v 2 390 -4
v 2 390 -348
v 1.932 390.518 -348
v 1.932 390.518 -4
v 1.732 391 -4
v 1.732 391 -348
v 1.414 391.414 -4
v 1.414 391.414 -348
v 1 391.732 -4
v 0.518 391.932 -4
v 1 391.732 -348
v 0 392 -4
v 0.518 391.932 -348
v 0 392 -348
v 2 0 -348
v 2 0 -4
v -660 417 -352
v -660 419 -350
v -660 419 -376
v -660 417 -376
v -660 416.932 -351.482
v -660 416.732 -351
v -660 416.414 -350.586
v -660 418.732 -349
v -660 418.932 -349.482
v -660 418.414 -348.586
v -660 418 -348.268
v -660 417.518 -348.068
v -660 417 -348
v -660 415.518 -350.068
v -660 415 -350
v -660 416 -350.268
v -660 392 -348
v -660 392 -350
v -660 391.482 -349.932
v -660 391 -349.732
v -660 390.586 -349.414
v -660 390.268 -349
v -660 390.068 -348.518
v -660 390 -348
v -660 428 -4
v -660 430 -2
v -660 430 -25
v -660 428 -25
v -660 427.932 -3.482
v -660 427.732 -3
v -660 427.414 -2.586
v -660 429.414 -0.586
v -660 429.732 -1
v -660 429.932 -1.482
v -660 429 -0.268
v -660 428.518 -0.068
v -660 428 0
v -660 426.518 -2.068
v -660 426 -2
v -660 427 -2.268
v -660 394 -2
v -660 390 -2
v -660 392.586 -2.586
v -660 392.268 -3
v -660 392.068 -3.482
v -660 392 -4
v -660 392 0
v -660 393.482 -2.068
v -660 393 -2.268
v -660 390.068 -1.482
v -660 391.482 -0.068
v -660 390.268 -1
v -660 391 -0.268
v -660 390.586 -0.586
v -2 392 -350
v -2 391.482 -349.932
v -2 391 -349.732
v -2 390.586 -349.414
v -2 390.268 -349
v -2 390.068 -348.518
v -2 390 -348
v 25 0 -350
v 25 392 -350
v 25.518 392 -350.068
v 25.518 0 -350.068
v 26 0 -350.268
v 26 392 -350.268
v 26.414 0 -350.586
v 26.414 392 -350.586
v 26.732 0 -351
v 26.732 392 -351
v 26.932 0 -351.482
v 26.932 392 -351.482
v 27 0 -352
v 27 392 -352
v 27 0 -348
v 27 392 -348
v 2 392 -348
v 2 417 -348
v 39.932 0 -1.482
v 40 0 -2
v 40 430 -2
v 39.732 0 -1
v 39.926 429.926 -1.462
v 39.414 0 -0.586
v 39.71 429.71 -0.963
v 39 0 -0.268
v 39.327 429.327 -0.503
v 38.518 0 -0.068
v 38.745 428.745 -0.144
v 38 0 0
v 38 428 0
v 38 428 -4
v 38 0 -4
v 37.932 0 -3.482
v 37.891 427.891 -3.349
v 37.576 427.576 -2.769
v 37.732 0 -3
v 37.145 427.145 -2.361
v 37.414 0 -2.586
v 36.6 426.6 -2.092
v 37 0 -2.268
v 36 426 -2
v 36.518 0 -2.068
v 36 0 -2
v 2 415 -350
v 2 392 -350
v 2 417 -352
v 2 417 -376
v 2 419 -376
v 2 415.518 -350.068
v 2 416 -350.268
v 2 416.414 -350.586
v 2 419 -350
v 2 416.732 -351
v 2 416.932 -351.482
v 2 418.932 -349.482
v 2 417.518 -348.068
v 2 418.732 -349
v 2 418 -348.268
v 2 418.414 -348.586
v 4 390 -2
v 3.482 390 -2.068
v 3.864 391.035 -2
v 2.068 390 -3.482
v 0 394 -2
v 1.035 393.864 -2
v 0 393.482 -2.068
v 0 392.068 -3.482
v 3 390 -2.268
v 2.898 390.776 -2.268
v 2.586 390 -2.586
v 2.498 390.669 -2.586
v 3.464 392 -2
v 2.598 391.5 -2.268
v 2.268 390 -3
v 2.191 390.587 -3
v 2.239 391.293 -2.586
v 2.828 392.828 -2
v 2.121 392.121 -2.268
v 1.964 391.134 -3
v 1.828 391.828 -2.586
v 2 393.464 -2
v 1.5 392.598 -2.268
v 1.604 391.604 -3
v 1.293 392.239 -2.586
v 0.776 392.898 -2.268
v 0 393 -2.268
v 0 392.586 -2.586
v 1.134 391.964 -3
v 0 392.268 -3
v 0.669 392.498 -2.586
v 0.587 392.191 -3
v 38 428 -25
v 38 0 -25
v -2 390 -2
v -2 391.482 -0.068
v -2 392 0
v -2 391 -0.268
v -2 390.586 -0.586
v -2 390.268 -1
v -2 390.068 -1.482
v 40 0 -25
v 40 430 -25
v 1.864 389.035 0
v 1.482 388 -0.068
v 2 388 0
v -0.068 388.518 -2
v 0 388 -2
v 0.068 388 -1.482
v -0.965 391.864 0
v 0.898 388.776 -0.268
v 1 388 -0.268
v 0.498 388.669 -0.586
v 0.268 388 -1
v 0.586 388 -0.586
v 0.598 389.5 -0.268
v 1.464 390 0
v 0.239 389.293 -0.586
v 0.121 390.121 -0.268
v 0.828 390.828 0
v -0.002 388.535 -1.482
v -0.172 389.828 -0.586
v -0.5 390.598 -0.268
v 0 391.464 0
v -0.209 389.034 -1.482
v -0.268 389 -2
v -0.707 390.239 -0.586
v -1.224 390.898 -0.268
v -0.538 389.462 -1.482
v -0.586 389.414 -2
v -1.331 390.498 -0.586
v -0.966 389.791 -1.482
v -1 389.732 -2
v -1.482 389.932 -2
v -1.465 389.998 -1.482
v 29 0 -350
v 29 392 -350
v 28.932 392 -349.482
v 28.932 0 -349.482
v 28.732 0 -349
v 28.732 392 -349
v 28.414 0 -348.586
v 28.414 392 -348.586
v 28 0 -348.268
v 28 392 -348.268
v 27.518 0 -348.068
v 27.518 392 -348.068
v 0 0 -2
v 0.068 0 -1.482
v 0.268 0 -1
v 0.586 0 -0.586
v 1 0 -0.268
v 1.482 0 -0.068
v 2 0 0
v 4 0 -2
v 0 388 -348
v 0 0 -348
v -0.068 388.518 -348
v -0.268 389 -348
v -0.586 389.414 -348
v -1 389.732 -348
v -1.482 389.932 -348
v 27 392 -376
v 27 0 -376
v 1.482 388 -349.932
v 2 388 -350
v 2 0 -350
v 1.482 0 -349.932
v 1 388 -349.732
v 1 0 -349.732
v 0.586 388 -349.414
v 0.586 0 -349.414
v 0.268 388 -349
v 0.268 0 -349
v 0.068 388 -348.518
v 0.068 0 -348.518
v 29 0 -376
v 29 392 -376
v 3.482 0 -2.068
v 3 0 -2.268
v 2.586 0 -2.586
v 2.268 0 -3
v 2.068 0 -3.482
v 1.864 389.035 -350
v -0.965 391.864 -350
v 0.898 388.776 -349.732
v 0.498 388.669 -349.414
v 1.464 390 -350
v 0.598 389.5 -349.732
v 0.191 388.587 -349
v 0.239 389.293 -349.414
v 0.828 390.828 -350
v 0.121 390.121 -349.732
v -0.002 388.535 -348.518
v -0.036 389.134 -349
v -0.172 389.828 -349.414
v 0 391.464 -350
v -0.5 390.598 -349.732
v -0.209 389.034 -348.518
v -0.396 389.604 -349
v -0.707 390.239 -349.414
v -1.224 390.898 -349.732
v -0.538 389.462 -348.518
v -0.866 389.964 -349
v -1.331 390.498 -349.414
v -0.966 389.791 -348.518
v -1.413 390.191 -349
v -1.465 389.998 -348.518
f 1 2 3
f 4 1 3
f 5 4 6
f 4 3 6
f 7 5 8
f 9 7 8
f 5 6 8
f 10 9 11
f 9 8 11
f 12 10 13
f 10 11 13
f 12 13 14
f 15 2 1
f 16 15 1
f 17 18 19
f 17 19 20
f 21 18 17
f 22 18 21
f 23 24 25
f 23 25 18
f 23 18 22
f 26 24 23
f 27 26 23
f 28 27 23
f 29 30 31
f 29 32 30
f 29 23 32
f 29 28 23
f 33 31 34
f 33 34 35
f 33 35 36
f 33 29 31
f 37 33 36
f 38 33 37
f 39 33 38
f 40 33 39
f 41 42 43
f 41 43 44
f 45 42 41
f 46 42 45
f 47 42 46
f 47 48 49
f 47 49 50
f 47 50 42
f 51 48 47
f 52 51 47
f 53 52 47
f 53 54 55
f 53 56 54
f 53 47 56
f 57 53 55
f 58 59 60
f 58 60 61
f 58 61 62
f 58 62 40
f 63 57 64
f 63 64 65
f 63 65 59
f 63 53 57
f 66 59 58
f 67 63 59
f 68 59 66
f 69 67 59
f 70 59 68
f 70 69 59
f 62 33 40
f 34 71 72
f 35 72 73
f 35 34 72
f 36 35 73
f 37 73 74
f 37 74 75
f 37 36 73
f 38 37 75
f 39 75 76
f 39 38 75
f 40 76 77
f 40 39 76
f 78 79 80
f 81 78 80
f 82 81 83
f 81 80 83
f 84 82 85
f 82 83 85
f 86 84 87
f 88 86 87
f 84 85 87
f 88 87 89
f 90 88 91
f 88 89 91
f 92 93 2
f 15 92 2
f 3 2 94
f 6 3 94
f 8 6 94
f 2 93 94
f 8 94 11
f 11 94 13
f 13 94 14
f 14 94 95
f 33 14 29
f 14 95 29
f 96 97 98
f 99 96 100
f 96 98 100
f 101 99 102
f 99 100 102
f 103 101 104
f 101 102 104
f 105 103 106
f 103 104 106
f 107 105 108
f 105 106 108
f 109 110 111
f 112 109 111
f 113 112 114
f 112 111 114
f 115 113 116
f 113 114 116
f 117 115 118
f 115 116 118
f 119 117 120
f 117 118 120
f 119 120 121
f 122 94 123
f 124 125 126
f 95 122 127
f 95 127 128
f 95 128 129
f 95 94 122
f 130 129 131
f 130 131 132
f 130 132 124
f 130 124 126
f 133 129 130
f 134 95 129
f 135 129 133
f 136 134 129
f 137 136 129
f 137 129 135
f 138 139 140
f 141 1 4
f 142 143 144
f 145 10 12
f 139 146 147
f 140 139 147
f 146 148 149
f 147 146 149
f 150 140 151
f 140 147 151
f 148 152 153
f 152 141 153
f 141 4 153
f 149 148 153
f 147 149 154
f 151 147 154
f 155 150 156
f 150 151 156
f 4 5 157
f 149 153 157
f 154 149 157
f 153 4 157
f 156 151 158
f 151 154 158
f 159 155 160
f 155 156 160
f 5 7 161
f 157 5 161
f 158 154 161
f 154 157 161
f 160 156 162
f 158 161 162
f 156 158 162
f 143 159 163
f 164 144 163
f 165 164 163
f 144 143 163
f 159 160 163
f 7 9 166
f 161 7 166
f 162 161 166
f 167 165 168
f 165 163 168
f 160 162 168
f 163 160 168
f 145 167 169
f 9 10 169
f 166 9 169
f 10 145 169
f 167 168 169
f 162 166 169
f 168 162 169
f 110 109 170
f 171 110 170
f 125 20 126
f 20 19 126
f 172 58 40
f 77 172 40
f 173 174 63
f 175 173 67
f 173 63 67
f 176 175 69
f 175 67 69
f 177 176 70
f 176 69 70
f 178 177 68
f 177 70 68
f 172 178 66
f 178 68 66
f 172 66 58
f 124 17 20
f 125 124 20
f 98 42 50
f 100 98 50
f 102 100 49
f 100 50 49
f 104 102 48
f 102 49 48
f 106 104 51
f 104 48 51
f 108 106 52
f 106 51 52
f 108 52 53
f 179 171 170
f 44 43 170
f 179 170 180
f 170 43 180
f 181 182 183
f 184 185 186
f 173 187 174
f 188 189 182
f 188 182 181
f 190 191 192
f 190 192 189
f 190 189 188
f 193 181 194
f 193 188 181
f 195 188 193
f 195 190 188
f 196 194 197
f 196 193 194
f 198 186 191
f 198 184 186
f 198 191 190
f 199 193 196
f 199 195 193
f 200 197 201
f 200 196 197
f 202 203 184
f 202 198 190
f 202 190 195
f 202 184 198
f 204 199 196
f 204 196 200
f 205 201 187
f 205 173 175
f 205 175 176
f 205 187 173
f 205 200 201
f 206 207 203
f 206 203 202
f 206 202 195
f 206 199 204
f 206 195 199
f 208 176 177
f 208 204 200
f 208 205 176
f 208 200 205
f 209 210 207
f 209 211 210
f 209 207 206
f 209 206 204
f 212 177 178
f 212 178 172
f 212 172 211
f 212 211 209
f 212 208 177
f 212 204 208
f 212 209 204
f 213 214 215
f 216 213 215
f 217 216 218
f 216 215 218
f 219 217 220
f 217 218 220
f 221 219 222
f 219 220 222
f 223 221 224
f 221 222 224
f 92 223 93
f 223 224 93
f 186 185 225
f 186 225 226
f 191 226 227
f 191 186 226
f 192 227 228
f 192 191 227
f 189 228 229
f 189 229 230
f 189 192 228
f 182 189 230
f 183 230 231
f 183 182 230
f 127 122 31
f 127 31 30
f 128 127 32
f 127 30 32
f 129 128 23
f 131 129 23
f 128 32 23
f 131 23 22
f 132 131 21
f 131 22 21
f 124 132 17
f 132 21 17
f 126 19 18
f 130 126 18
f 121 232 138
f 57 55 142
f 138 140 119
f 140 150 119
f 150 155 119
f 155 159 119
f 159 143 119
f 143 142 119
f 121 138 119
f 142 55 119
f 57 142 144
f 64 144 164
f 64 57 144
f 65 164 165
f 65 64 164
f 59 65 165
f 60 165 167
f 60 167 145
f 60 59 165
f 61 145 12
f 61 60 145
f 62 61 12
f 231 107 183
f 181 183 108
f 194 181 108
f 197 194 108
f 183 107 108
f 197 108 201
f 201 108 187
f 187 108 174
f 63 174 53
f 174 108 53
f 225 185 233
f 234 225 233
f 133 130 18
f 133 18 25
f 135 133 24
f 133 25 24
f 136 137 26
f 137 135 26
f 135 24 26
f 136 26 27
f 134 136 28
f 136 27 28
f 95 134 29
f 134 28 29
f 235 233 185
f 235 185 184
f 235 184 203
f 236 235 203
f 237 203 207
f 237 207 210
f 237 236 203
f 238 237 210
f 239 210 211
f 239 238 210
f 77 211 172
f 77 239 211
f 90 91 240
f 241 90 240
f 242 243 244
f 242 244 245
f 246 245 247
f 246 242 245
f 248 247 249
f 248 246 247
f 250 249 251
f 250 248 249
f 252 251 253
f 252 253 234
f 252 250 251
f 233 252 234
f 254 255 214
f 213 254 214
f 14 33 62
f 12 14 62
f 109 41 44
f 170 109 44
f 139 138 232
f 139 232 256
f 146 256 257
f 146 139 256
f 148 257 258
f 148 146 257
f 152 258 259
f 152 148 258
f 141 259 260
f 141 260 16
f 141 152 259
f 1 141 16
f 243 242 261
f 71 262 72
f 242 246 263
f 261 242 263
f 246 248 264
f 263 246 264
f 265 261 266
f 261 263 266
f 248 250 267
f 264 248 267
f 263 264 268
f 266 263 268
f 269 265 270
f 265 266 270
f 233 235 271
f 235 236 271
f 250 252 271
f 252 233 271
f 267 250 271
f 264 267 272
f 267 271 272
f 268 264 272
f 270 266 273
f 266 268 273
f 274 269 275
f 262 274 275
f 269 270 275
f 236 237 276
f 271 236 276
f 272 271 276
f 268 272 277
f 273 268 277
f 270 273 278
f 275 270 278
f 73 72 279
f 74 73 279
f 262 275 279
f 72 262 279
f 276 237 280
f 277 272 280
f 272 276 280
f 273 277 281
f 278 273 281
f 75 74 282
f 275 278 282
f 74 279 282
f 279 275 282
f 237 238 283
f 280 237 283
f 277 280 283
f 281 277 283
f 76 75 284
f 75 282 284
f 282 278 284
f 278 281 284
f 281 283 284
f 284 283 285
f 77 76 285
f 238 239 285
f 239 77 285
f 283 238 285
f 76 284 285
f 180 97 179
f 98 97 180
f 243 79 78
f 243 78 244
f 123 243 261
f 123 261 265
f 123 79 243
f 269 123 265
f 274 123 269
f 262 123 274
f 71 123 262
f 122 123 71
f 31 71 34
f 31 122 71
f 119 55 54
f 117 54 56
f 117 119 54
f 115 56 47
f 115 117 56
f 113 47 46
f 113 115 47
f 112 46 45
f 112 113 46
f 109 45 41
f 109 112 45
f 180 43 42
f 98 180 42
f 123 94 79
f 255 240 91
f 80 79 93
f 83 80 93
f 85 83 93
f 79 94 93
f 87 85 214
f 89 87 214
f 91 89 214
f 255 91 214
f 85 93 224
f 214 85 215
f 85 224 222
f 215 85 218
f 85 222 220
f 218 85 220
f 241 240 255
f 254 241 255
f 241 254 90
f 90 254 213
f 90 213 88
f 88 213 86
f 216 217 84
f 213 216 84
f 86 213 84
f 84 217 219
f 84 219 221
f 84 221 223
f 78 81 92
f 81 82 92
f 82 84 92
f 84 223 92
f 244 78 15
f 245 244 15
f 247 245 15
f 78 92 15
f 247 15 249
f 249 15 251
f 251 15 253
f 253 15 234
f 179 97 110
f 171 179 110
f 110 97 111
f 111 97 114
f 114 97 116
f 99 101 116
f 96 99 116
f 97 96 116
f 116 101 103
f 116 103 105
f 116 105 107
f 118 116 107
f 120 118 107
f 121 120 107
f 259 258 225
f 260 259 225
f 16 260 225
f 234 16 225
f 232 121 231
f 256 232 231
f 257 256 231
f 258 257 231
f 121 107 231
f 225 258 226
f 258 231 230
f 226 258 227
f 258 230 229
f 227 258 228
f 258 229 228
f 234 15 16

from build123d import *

# Parameters (mm, degrees)
F3_W         = 27
F3_H         = 27
F4_DEPTH     = 30
F5_T1_DEPTH  = 662
F5_T3_DEPTH  = 392
F5_T5_DEPTH  = 350
F5_T10_DEPTH = 433
F5_T15_DEPTH = 703
F5_T17_DEPTH = 402
F5_T19_DEPTH = 672
F5_T21_DEPTH = 710
F5_T23_DEPTH = 440
F5_T25_DEPTH = 346
F5_T27_DEPTH = 390
F5_T29_DEPTH = 660
F5_T32_ANGLE = 90
F5_T33_DEPTH = 393
F5_T35_DEPTH = 663
F5_T38_ANGLE = 90
F5_T40_ANGLE = 90


# Not quite as in the source:
# - a fillet or chamfer that OpenCascade refuses, or shapes differently, is made with other operations: its cross-section is extruded or revolved along the edge and cut away or added


with BuildPart() as f2:
    # F2: sweep along a path in F1
    with BuildLine(Plane.XY) as f2_path:
        Line((0, 0), (0, 390))
        Line((0, 390), (-660, 390))
    # F0 (on Front) → F2 (sweep)
    with BuildSketch(Plane.XZ):
        Polygon((38, -2), (38, -25), (40, -25), (40, 0), (0, 0), (0, -350), (27, -350), (27, -376), (29, -376), (29, -348), (2, -348), (2, -2), align=None)
    sweep(path=f2_path.line, transition=Transition.RIGHT)

    # F3 (on face) → F4 (cut)
    with BuildSketch(Plane.XY.offset(-348)):
        with Locations((15.5, 405.5)):
            Rectangle(F3_W, F3_H)
    extrude(amount=-F4_DEPTH, mode=Mode.SUBTRACT)

    # F5: fillet of radius 2 on 16 edges, made by hand

    # F5_s2 → F5_t1 (join)
    with BuildSketch(Plane.YZ.offset(-660)):
        with BuildLine():
            ThreePointArc((415, -350), (416.4142135624, -350.5857864376), (417, -352))
            Line((417, -352), (417, -350))
            Line((417, -350), (415, -350))
        make_face()
    extrude(amount=F5_T1_DEPTH)

    # F5_s4 → F5_t3 (join)
    with BuildSketch(Plane.XZ.offset(-392)):
        with BuildLine():
            ThreePointArc((25, -350), (26.4142135624, -350.5857864376), (27, -352))
            Line((27, -352), (27, -350))
            Line((27, -350), (25, -350))
        make_face()
    extrude(amount=F5_T3_DEPTH)

    # F5_s6 → F5_t5 (join)
    with BuildSketch(Plane.XY.offset(-350)):
        with BuildLine():
            ThreePointArc((0, 388), (-0.5857864376, 389.4142135624), (-2, 390))
            Line((-2, 390), (0, 390))
            Line((0, 390), (0, 388))
        make_face()
    extrude(amount=F5_T5_DEPTH)


with BuildPart() as f5_tool8:
    # F5_s9 → F5_t10 (new body)
    with BuildSketch(Plane.XZ):
        with BuildLine():
            ThreePointArc((38, -4), (37.4142135624, -2.5857864376), (36, -2))
            Line((36, -2), (38, -2))
            Line((38, -2), (38, -4))
        make_face()
    extrude(amount=-F5_T10_DEPTH)

    split(bisect_by=Plane.XZ.offset(-430), keep=Keep.TOP)


with BuildPart() as f2_1:
    add(f2.part)

    # F5_t7: union F5_tool8
    add(f5_tool8.part)


with BuildPart() as f5_tool13:
    # F5_s14 → F5_t15 (new body)
    with BuildSketch(Plane.YZ.offset(43)):
        with BuildLine():
            ThreePointArc((426, -2), (427.4142135624, -2.5857864376), (428, -4))
            Line((428, -4), (428, -2))
            Line((428, -2), (426, -2))
        make_face()
    extrude(amount=-F5_T15_DEPTH)

    split(bisect_by=Plane.YZ.offset(40), keep=Keep.BOTTOM)


with BuildPart() as f2_2:
    add(f2_1.part)

    # F5_t12: union F5_tool13
    add(f5_tool13.part)

    # F5_s18 → F5_t17 (cut)
    with BuildSketch(Plane.XZ.offset(-397)):
        with BuildLine():
            ThreePointArc((29, -350), (28.4142135624, -348.5857864376), (27, -348))
            Line((27, -348), (29, -348))
            Line((29, -348), (29, -350))
        make_face()
    extrude(amount=F5_T17_DEPTH, mode=Mode.SUBTRACT)

    # F5_s20 → F5_t19 (cut)
    with BuildSketch(Plane.YZ.offset(-665)):
        with BuildLine():
            ThreePointArc((419, -350), (418.4142135624, -348.5857864376), (417, -348))
            Line((417, -348), (419, -348))
            Line((419, -348), (419, -350))
        make_face()
    extrude(amount=F5_T19_DEPTH, mode=Mode.SUBTRACT)

    # F5_s22 → F5_t21 (cut)
    with BuildSketch(Plane.YZ.offset(-665)):
        with BuildLine():
            ThreePointArc((430, -2), (429.4142135624, -0.5857864376), (428, 0))
            Line((428, 0), (430, 0))
            Line((430, 0), (430, -2))
        make_face()
    extrude(amount=F5_T21_DEPTH, mode=Mode.SUBTRACT)

    # F5_s24 → F5_t23 (cut)
    with BuildSketch(Plane.XZ.offset(-435)):
        with BuildLine():
            ThreePointArc((40, -2), (39.4142135624, -0.5857864376), (38, 0))
            Line((38, 0), (40, 0))
            Line((40, 0), (40, -2))
        make_face()
    extrude(amount=F5_T23_DEPTH, mode=Mode.SUBTRACT)

    # F5_s26 → F5_t25 (cut)
    with BuildSketch(Plane.XY.offset(-348)):
        with BuildLine():
            ThreePointArc((2, 390), (1.4142135624, 391.4142135624), (0, 392))
            Line((0, 392), (2, 392))
            Line((2, 392), (2, 390))
        make_face()
    extrude(amount=F5_T25_DEPTH, mode=Mode.SUBTRACT)

    # F5_s28 → F5_t27 (join)
    with BuildSketch(Plane.XZ.offset(-390)):
        with BuildLine():
            ThreePointArc((4, -2), (2.5857864376, -2.5857864376), (2, -4))
            Line((2, -4), (2, -2))
            Line((2, -2), (4, -2))
        make_face()
    extrude(amount=F5_T27_DEPTH)

    # F5_s30 → F5_t29 (join)
    with BuildSketch(Plane.YZ.offset(-660)):
        with BuildLine():
            ThreePointArc((394, -2), (392.5857864376, -2.5857864376), (392, -4))
            Line((392, -4), (392, -2))
            Line((392, -2), (394, -2))
        make_face()
    extrude(amount=F5_T29_DEPTH)

    # F5_s31 → F5_t32 (revolve)
    with BuildSketch(Plane.XZ.offset(-390)):
        with BuildLine():
            ThreePointArc((4, -2), (2.5857864376, -2.5857864376), (2, -4))
            Line((2, -4), (2, -2))
            Line((2, -2), (4, -2))
        make_face()
    revolve(axis=Axis((0, 390, -2), (0, 0, 1)), revolution_arc=F5_T32_ANGLE)

    # F5_s34 → F5_t33 (cut)
    with BuildSketch(Plane.XZ.offset(-388)):
        with BuildLine():
            ThreePointArc((2, -350), (0.5857864376, -349.4142135624), (0, -348))
            Line((0, -348), (0, -350))
            Line((0, -350), (2, -350))
        make_face()
        with BuildLine():
            ThreePointArc((0, -2), (0.5857864376, -0.5857864376), (2, 0))
            Line((2, 0), (0, 0))
            Line((0, 0), (0, -2))
        make_face()
    extrude(amount=F5_T33_DEPTH, mode=Mode.SUBTRACT)

    # F5_s36 → F5_t35 (cut)
    with BuildSketch(Plane.YZ.offset(-665)):
        with BuildLine():
            ThreePointArc((392, -350), (390.5857864376, -349.4142135624), (390, -348))
            Line((390, -348), (390, -350))
            Line((390, -350), (392, -350))
        make_face()
        with BuildLine():
            ThreePointArc((392, 0), (390.5857864376, -0.5857864376), (390, -2))
            Line((390, -2), (390, 0))
            Line((390, 0), (392, 0))
        make_face()
    extrude(amount=F5_T35_DEPTH, mode=Mode.SUBTRACT)

    # F5_s37 → F5_t38 (revolve, cut)
    with BuildSketch(Plane.XZ.offset(-388)):
        with BuildLine():
            ThreePointArc((2, 0), (0.5857864376, -0.5857864376), (0, -2))
            Line((0, -2), (0, 0))
            Line((0, 0), (2, 0))
        make_face()
    revolve(axis=Axis((-2, 388, 0), (0, 0, 1)), revolution_arc=F5_T38_ANGLE, mode=Mode.SUBTRACT)

    # F5_s39 → F5_t40 (revolve, cut)
    with BuildSketch(Plane.XZ.offset(-388)):
        with BuildLine():
            ThreePointArc((2, -350), (0.5857864376, -349.4142135624), (0, -348))
            Line((0, -348), (0, -350))
            Line((0, -350), (2, -350))
        make_face()
    revolve(axis=Axis((-2, 388, -350), (0, 0, 1)), revolution_arc=F5_T40_ANGLE, mode=Mode.SUBTRACT)


solid = f2_2.part
